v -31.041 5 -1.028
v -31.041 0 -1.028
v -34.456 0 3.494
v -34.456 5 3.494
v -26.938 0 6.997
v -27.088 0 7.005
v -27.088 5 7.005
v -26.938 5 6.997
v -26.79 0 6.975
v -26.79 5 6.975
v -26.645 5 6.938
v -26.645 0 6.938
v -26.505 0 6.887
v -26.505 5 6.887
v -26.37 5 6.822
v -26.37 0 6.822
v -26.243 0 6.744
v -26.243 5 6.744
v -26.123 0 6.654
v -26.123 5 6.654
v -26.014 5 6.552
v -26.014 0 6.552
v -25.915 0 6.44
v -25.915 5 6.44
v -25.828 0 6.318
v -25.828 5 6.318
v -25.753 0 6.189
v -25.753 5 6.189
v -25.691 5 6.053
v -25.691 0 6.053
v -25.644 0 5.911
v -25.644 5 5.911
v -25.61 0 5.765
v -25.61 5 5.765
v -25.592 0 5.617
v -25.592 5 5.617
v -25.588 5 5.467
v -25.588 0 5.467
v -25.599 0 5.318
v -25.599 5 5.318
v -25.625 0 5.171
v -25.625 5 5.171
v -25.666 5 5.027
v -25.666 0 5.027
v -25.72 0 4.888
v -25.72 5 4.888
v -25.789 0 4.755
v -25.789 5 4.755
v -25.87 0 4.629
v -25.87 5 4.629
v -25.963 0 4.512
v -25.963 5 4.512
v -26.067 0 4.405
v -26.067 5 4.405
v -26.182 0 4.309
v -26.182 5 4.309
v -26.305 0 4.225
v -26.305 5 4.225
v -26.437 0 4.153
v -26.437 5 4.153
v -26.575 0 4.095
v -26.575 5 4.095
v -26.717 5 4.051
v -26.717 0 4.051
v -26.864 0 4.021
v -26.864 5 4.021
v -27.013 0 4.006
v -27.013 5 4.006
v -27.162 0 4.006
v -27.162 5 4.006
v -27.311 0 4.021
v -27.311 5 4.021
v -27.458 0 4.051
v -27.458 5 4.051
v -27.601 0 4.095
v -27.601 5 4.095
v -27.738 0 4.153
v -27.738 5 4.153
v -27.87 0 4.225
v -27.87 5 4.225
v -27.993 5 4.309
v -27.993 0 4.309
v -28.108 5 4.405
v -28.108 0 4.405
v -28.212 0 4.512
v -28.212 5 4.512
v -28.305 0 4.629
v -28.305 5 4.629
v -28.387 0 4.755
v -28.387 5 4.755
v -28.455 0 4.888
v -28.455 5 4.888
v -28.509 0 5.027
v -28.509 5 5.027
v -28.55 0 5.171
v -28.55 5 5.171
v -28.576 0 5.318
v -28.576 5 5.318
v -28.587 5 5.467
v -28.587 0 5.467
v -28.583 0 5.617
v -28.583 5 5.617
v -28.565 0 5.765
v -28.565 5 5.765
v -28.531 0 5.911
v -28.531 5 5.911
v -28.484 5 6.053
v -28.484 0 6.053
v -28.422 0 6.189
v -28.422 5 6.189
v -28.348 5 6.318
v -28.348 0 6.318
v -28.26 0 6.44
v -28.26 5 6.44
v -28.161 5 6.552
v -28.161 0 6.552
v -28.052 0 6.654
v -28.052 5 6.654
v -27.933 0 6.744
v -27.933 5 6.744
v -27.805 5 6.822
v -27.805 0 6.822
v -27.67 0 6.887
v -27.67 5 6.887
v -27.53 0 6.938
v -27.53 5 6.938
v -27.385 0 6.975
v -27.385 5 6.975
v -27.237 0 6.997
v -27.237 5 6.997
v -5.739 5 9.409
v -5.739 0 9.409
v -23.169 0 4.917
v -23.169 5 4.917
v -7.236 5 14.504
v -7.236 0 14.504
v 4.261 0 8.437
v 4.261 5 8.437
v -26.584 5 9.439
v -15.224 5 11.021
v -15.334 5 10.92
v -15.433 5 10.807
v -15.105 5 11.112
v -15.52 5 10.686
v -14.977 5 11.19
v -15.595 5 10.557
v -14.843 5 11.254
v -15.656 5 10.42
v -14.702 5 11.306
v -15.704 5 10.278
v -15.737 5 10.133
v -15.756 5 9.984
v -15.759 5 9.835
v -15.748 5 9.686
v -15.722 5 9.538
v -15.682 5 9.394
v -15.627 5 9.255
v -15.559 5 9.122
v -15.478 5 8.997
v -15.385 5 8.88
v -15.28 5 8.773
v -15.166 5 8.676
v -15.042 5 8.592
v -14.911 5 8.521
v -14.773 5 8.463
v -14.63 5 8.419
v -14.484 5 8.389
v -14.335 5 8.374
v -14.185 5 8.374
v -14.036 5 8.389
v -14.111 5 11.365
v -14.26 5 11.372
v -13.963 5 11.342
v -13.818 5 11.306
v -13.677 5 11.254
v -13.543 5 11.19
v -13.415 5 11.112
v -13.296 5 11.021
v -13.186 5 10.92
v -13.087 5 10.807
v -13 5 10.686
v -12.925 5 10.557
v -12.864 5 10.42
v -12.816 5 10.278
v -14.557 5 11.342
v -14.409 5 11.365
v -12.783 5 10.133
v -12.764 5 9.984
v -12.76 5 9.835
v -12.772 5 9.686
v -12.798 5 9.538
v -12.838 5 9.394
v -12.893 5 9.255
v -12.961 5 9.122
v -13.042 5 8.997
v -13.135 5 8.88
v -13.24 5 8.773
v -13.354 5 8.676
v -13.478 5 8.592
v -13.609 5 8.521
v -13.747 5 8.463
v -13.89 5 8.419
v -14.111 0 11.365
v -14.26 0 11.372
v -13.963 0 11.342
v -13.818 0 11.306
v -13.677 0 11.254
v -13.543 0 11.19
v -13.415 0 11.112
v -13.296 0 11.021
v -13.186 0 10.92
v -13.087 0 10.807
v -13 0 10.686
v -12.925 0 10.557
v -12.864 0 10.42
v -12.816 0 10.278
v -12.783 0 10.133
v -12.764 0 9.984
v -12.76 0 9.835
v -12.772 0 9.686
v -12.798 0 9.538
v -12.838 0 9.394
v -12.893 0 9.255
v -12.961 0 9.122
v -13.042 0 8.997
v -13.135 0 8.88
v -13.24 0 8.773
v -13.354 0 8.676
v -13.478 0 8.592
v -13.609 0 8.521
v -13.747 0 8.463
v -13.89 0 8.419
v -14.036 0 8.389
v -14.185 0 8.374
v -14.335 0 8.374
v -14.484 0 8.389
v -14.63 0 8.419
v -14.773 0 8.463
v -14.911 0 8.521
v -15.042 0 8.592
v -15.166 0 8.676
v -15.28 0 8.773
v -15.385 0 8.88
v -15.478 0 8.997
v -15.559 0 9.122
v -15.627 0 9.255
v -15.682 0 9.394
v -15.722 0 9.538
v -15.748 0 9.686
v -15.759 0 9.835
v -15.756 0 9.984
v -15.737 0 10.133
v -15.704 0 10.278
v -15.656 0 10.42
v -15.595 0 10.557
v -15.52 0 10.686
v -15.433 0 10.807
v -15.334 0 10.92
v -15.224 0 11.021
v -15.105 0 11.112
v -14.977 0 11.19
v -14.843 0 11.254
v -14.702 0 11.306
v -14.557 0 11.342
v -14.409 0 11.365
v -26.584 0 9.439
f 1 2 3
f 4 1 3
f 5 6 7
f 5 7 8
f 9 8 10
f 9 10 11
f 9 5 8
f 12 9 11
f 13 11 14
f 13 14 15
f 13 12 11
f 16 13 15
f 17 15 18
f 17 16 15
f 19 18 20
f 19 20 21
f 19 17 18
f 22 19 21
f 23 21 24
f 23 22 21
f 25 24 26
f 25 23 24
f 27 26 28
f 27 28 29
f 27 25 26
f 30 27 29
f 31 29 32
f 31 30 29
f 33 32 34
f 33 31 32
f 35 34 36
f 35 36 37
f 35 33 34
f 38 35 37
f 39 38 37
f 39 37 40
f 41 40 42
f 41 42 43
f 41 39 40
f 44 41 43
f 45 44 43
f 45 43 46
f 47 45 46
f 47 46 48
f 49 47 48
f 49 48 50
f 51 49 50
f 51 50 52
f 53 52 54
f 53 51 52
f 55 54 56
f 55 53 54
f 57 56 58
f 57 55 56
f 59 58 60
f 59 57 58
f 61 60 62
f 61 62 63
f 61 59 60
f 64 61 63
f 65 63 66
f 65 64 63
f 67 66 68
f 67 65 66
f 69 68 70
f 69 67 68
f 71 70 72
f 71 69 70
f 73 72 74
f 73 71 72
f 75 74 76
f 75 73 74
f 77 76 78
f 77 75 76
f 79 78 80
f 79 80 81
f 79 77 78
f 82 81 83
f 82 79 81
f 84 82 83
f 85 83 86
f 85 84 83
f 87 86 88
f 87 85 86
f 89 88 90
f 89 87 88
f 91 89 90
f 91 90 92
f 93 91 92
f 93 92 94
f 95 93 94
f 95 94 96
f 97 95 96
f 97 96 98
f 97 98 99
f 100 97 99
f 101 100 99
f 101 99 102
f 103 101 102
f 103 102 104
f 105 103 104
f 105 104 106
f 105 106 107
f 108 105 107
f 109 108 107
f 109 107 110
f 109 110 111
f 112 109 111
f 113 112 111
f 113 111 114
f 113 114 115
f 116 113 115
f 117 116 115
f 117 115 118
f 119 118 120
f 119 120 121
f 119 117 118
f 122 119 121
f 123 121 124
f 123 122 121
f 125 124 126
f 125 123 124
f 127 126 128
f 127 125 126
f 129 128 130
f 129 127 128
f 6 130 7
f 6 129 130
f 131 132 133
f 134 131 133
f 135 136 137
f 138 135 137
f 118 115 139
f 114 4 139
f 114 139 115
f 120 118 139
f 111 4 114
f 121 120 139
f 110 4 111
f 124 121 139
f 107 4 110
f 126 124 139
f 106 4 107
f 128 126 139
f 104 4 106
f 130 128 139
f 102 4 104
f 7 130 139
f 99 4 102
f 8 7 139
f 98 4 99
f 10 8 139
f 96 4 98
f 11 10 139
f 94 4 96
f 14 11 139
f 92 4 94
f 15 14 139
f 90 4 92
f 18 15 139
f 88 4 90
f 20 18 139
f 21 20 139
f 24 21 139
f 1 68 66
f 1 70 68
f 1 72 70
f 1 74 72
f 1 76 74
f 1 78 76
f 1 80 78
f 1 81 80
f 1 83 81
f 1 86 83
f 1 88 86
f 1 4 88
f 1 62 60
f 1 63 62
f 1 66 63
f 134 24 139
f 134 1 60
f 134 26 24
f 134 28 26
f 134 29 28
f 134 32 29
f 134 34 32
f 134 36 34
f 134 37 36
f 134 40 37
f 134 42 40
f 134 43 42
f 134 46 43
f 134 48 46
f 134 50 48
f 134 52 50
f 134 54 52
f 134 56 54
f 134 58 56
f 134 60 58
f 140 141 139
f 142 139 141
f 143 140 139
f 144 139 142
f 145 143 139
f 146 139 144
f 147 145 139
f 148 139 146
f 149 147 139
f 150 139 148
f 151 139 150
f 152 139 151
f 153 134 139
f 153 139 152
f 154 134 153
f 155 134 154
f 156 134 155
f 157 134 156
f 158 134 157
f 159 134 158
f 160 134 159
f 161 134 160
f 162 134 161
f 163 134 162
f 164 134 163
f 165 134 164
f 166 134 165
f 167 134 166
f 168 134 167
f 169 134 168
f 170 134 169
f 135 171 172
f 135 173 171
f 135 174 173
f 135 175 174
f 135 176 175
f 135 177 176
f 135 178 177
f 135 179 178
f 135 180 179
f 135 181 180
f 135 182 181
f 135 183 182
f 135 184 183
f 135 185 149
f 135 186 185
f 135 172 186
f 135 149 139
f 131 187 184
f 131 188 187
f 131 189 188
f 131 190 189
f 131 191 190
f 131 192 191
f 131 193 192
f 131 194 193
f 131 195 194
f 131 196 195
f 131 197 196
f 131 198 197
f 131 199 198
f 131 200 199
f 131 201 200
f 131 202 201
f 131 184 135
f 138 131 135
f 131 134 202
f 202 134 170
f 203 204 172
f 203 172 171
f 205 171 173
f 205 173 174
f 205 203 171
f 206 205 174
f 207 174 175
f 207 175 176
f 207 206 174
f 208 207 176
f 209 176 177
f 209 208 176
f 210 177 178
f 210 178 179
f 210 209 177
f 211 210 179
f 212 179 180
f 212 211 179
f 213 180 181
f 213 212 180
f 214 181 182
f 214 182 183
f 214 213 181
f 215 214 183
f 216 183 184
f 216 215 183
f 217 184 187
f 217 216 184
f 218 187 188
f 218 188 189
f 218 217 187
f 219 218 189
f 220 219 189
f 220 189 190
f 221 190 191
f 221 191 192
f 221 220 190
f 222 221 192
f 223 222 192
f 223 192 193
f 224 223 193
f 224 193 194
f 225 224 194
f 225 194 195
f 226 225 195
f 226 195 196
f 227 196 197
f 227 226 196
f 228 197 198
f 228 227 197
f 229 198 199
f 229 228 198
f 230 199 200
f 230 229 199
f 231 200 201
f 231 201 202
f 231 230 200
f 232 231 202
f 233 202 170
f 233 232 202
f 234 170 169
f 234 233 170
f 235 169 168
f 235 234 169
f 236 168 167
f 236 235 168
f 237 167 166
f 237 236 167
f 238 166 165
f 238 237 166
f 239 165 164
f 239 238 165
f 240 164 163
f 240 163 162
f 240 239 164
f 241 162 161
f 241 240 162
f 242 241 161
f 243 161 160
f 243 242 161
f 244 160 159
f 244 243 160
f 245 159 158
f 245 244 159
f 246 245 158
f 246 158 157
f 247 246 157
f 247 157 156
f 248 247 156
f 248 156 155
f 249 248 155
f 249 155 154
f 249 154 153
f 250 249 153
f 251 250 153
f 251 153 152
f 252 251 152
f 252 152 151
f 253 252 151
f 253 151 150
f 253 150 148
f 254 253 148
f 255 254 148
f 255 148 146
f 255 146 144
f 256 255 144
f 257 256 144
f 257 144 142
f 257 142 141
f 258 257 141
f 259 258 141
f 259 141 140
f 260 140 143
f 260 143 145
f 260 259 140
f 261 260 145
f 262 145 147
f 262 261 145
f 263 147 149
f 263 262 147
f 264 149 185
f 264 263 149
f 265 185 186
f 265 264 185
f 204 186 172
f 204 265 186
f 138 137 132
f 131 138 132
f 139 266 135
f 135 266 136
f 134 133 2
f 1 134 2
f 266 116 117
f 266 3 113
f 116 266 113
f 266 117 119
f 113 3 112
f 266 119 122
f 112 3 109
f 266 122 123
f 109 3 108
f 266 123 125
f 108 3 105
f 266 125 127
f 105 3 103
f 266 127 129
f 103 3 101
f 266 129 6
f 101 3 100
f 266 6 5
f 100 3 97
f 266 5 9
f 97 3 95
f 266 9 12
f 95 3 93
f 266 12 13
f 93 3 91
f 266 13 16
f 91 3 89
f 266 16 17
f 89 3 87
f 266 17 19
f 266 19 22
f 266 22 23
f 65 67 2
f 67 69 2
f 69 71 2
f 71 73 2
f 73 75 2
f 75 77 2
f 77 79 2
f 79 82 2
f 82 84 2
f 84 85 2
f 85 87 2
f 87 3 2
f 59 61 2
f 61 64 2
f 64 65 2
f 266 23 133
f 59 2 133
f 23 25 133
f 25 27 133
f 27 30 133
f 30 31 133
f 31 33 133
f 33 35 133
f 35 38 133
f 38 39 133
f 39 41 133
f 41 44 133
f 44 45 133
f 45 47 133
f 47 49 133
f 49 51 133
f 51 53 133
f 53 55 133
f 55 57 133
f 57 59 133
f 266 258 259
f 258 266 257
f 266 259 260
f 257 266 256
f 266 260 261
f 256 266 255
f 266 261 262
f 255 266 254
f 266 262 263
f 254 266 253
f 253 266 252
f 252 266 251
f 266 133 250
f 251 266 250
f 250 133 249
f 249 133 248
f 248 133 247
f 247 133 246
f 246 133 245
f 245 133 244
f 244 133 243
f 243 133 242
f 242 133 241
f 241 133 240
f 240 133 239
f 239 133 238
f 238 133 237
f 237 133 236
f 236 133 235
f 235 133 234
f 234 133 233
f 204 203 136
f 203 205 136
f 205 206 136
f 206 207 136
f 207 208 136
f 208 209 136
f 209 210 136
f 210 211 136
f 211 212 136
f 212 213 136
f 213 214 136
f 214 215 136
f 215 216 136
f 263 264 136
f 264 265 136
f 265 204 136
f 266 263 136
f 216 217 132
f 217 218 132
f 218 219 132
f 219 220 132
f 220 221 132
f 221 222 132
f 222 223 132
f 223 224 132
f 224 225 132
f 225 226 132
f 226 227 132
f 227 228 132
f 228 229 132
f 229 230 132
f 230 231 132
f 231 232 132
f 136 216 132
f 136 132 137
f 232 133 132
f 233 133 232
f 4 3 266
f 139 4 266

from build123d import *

# Parameters (mm, degrees)
SKETCH_1_R      = 1.5
EXTRUDE_1_DEPTH = 5


with BuildPart() as part:
    # 草图1 → 凸台-拉伸1 (new body)
    with BuildSketch(Plane(origin=(0, 0, 0), x_dir=(1, 0, 0), z_dir=(0, 1, 0))):
        Polygon((-34.456184954, -3.49420181), (-26.584074683, -9.438943538), (-7.236140092, -14.504259625), (4.261211757, -8.437060891), (-5.738788243, -9.408767904), (-23.169375756, -4.917151386), (-31.041486027, 1.027590342), align=None)
        with Locations(Location((-27.087553114, -5.504570551, 0), (0, 0, 270))):
            Circle(SKETCH_1_R, mode=Mode.SUBTRACT)
        with Locations(Location((-14.25994565, -9.87219173, 0), (0, 0, 270))):
            Circle(SKETCH_1_R, mode=Mode.SUBTRACT)
    extrude(amount=EXTRUDE_1_DEPTH)


solid = part.part
